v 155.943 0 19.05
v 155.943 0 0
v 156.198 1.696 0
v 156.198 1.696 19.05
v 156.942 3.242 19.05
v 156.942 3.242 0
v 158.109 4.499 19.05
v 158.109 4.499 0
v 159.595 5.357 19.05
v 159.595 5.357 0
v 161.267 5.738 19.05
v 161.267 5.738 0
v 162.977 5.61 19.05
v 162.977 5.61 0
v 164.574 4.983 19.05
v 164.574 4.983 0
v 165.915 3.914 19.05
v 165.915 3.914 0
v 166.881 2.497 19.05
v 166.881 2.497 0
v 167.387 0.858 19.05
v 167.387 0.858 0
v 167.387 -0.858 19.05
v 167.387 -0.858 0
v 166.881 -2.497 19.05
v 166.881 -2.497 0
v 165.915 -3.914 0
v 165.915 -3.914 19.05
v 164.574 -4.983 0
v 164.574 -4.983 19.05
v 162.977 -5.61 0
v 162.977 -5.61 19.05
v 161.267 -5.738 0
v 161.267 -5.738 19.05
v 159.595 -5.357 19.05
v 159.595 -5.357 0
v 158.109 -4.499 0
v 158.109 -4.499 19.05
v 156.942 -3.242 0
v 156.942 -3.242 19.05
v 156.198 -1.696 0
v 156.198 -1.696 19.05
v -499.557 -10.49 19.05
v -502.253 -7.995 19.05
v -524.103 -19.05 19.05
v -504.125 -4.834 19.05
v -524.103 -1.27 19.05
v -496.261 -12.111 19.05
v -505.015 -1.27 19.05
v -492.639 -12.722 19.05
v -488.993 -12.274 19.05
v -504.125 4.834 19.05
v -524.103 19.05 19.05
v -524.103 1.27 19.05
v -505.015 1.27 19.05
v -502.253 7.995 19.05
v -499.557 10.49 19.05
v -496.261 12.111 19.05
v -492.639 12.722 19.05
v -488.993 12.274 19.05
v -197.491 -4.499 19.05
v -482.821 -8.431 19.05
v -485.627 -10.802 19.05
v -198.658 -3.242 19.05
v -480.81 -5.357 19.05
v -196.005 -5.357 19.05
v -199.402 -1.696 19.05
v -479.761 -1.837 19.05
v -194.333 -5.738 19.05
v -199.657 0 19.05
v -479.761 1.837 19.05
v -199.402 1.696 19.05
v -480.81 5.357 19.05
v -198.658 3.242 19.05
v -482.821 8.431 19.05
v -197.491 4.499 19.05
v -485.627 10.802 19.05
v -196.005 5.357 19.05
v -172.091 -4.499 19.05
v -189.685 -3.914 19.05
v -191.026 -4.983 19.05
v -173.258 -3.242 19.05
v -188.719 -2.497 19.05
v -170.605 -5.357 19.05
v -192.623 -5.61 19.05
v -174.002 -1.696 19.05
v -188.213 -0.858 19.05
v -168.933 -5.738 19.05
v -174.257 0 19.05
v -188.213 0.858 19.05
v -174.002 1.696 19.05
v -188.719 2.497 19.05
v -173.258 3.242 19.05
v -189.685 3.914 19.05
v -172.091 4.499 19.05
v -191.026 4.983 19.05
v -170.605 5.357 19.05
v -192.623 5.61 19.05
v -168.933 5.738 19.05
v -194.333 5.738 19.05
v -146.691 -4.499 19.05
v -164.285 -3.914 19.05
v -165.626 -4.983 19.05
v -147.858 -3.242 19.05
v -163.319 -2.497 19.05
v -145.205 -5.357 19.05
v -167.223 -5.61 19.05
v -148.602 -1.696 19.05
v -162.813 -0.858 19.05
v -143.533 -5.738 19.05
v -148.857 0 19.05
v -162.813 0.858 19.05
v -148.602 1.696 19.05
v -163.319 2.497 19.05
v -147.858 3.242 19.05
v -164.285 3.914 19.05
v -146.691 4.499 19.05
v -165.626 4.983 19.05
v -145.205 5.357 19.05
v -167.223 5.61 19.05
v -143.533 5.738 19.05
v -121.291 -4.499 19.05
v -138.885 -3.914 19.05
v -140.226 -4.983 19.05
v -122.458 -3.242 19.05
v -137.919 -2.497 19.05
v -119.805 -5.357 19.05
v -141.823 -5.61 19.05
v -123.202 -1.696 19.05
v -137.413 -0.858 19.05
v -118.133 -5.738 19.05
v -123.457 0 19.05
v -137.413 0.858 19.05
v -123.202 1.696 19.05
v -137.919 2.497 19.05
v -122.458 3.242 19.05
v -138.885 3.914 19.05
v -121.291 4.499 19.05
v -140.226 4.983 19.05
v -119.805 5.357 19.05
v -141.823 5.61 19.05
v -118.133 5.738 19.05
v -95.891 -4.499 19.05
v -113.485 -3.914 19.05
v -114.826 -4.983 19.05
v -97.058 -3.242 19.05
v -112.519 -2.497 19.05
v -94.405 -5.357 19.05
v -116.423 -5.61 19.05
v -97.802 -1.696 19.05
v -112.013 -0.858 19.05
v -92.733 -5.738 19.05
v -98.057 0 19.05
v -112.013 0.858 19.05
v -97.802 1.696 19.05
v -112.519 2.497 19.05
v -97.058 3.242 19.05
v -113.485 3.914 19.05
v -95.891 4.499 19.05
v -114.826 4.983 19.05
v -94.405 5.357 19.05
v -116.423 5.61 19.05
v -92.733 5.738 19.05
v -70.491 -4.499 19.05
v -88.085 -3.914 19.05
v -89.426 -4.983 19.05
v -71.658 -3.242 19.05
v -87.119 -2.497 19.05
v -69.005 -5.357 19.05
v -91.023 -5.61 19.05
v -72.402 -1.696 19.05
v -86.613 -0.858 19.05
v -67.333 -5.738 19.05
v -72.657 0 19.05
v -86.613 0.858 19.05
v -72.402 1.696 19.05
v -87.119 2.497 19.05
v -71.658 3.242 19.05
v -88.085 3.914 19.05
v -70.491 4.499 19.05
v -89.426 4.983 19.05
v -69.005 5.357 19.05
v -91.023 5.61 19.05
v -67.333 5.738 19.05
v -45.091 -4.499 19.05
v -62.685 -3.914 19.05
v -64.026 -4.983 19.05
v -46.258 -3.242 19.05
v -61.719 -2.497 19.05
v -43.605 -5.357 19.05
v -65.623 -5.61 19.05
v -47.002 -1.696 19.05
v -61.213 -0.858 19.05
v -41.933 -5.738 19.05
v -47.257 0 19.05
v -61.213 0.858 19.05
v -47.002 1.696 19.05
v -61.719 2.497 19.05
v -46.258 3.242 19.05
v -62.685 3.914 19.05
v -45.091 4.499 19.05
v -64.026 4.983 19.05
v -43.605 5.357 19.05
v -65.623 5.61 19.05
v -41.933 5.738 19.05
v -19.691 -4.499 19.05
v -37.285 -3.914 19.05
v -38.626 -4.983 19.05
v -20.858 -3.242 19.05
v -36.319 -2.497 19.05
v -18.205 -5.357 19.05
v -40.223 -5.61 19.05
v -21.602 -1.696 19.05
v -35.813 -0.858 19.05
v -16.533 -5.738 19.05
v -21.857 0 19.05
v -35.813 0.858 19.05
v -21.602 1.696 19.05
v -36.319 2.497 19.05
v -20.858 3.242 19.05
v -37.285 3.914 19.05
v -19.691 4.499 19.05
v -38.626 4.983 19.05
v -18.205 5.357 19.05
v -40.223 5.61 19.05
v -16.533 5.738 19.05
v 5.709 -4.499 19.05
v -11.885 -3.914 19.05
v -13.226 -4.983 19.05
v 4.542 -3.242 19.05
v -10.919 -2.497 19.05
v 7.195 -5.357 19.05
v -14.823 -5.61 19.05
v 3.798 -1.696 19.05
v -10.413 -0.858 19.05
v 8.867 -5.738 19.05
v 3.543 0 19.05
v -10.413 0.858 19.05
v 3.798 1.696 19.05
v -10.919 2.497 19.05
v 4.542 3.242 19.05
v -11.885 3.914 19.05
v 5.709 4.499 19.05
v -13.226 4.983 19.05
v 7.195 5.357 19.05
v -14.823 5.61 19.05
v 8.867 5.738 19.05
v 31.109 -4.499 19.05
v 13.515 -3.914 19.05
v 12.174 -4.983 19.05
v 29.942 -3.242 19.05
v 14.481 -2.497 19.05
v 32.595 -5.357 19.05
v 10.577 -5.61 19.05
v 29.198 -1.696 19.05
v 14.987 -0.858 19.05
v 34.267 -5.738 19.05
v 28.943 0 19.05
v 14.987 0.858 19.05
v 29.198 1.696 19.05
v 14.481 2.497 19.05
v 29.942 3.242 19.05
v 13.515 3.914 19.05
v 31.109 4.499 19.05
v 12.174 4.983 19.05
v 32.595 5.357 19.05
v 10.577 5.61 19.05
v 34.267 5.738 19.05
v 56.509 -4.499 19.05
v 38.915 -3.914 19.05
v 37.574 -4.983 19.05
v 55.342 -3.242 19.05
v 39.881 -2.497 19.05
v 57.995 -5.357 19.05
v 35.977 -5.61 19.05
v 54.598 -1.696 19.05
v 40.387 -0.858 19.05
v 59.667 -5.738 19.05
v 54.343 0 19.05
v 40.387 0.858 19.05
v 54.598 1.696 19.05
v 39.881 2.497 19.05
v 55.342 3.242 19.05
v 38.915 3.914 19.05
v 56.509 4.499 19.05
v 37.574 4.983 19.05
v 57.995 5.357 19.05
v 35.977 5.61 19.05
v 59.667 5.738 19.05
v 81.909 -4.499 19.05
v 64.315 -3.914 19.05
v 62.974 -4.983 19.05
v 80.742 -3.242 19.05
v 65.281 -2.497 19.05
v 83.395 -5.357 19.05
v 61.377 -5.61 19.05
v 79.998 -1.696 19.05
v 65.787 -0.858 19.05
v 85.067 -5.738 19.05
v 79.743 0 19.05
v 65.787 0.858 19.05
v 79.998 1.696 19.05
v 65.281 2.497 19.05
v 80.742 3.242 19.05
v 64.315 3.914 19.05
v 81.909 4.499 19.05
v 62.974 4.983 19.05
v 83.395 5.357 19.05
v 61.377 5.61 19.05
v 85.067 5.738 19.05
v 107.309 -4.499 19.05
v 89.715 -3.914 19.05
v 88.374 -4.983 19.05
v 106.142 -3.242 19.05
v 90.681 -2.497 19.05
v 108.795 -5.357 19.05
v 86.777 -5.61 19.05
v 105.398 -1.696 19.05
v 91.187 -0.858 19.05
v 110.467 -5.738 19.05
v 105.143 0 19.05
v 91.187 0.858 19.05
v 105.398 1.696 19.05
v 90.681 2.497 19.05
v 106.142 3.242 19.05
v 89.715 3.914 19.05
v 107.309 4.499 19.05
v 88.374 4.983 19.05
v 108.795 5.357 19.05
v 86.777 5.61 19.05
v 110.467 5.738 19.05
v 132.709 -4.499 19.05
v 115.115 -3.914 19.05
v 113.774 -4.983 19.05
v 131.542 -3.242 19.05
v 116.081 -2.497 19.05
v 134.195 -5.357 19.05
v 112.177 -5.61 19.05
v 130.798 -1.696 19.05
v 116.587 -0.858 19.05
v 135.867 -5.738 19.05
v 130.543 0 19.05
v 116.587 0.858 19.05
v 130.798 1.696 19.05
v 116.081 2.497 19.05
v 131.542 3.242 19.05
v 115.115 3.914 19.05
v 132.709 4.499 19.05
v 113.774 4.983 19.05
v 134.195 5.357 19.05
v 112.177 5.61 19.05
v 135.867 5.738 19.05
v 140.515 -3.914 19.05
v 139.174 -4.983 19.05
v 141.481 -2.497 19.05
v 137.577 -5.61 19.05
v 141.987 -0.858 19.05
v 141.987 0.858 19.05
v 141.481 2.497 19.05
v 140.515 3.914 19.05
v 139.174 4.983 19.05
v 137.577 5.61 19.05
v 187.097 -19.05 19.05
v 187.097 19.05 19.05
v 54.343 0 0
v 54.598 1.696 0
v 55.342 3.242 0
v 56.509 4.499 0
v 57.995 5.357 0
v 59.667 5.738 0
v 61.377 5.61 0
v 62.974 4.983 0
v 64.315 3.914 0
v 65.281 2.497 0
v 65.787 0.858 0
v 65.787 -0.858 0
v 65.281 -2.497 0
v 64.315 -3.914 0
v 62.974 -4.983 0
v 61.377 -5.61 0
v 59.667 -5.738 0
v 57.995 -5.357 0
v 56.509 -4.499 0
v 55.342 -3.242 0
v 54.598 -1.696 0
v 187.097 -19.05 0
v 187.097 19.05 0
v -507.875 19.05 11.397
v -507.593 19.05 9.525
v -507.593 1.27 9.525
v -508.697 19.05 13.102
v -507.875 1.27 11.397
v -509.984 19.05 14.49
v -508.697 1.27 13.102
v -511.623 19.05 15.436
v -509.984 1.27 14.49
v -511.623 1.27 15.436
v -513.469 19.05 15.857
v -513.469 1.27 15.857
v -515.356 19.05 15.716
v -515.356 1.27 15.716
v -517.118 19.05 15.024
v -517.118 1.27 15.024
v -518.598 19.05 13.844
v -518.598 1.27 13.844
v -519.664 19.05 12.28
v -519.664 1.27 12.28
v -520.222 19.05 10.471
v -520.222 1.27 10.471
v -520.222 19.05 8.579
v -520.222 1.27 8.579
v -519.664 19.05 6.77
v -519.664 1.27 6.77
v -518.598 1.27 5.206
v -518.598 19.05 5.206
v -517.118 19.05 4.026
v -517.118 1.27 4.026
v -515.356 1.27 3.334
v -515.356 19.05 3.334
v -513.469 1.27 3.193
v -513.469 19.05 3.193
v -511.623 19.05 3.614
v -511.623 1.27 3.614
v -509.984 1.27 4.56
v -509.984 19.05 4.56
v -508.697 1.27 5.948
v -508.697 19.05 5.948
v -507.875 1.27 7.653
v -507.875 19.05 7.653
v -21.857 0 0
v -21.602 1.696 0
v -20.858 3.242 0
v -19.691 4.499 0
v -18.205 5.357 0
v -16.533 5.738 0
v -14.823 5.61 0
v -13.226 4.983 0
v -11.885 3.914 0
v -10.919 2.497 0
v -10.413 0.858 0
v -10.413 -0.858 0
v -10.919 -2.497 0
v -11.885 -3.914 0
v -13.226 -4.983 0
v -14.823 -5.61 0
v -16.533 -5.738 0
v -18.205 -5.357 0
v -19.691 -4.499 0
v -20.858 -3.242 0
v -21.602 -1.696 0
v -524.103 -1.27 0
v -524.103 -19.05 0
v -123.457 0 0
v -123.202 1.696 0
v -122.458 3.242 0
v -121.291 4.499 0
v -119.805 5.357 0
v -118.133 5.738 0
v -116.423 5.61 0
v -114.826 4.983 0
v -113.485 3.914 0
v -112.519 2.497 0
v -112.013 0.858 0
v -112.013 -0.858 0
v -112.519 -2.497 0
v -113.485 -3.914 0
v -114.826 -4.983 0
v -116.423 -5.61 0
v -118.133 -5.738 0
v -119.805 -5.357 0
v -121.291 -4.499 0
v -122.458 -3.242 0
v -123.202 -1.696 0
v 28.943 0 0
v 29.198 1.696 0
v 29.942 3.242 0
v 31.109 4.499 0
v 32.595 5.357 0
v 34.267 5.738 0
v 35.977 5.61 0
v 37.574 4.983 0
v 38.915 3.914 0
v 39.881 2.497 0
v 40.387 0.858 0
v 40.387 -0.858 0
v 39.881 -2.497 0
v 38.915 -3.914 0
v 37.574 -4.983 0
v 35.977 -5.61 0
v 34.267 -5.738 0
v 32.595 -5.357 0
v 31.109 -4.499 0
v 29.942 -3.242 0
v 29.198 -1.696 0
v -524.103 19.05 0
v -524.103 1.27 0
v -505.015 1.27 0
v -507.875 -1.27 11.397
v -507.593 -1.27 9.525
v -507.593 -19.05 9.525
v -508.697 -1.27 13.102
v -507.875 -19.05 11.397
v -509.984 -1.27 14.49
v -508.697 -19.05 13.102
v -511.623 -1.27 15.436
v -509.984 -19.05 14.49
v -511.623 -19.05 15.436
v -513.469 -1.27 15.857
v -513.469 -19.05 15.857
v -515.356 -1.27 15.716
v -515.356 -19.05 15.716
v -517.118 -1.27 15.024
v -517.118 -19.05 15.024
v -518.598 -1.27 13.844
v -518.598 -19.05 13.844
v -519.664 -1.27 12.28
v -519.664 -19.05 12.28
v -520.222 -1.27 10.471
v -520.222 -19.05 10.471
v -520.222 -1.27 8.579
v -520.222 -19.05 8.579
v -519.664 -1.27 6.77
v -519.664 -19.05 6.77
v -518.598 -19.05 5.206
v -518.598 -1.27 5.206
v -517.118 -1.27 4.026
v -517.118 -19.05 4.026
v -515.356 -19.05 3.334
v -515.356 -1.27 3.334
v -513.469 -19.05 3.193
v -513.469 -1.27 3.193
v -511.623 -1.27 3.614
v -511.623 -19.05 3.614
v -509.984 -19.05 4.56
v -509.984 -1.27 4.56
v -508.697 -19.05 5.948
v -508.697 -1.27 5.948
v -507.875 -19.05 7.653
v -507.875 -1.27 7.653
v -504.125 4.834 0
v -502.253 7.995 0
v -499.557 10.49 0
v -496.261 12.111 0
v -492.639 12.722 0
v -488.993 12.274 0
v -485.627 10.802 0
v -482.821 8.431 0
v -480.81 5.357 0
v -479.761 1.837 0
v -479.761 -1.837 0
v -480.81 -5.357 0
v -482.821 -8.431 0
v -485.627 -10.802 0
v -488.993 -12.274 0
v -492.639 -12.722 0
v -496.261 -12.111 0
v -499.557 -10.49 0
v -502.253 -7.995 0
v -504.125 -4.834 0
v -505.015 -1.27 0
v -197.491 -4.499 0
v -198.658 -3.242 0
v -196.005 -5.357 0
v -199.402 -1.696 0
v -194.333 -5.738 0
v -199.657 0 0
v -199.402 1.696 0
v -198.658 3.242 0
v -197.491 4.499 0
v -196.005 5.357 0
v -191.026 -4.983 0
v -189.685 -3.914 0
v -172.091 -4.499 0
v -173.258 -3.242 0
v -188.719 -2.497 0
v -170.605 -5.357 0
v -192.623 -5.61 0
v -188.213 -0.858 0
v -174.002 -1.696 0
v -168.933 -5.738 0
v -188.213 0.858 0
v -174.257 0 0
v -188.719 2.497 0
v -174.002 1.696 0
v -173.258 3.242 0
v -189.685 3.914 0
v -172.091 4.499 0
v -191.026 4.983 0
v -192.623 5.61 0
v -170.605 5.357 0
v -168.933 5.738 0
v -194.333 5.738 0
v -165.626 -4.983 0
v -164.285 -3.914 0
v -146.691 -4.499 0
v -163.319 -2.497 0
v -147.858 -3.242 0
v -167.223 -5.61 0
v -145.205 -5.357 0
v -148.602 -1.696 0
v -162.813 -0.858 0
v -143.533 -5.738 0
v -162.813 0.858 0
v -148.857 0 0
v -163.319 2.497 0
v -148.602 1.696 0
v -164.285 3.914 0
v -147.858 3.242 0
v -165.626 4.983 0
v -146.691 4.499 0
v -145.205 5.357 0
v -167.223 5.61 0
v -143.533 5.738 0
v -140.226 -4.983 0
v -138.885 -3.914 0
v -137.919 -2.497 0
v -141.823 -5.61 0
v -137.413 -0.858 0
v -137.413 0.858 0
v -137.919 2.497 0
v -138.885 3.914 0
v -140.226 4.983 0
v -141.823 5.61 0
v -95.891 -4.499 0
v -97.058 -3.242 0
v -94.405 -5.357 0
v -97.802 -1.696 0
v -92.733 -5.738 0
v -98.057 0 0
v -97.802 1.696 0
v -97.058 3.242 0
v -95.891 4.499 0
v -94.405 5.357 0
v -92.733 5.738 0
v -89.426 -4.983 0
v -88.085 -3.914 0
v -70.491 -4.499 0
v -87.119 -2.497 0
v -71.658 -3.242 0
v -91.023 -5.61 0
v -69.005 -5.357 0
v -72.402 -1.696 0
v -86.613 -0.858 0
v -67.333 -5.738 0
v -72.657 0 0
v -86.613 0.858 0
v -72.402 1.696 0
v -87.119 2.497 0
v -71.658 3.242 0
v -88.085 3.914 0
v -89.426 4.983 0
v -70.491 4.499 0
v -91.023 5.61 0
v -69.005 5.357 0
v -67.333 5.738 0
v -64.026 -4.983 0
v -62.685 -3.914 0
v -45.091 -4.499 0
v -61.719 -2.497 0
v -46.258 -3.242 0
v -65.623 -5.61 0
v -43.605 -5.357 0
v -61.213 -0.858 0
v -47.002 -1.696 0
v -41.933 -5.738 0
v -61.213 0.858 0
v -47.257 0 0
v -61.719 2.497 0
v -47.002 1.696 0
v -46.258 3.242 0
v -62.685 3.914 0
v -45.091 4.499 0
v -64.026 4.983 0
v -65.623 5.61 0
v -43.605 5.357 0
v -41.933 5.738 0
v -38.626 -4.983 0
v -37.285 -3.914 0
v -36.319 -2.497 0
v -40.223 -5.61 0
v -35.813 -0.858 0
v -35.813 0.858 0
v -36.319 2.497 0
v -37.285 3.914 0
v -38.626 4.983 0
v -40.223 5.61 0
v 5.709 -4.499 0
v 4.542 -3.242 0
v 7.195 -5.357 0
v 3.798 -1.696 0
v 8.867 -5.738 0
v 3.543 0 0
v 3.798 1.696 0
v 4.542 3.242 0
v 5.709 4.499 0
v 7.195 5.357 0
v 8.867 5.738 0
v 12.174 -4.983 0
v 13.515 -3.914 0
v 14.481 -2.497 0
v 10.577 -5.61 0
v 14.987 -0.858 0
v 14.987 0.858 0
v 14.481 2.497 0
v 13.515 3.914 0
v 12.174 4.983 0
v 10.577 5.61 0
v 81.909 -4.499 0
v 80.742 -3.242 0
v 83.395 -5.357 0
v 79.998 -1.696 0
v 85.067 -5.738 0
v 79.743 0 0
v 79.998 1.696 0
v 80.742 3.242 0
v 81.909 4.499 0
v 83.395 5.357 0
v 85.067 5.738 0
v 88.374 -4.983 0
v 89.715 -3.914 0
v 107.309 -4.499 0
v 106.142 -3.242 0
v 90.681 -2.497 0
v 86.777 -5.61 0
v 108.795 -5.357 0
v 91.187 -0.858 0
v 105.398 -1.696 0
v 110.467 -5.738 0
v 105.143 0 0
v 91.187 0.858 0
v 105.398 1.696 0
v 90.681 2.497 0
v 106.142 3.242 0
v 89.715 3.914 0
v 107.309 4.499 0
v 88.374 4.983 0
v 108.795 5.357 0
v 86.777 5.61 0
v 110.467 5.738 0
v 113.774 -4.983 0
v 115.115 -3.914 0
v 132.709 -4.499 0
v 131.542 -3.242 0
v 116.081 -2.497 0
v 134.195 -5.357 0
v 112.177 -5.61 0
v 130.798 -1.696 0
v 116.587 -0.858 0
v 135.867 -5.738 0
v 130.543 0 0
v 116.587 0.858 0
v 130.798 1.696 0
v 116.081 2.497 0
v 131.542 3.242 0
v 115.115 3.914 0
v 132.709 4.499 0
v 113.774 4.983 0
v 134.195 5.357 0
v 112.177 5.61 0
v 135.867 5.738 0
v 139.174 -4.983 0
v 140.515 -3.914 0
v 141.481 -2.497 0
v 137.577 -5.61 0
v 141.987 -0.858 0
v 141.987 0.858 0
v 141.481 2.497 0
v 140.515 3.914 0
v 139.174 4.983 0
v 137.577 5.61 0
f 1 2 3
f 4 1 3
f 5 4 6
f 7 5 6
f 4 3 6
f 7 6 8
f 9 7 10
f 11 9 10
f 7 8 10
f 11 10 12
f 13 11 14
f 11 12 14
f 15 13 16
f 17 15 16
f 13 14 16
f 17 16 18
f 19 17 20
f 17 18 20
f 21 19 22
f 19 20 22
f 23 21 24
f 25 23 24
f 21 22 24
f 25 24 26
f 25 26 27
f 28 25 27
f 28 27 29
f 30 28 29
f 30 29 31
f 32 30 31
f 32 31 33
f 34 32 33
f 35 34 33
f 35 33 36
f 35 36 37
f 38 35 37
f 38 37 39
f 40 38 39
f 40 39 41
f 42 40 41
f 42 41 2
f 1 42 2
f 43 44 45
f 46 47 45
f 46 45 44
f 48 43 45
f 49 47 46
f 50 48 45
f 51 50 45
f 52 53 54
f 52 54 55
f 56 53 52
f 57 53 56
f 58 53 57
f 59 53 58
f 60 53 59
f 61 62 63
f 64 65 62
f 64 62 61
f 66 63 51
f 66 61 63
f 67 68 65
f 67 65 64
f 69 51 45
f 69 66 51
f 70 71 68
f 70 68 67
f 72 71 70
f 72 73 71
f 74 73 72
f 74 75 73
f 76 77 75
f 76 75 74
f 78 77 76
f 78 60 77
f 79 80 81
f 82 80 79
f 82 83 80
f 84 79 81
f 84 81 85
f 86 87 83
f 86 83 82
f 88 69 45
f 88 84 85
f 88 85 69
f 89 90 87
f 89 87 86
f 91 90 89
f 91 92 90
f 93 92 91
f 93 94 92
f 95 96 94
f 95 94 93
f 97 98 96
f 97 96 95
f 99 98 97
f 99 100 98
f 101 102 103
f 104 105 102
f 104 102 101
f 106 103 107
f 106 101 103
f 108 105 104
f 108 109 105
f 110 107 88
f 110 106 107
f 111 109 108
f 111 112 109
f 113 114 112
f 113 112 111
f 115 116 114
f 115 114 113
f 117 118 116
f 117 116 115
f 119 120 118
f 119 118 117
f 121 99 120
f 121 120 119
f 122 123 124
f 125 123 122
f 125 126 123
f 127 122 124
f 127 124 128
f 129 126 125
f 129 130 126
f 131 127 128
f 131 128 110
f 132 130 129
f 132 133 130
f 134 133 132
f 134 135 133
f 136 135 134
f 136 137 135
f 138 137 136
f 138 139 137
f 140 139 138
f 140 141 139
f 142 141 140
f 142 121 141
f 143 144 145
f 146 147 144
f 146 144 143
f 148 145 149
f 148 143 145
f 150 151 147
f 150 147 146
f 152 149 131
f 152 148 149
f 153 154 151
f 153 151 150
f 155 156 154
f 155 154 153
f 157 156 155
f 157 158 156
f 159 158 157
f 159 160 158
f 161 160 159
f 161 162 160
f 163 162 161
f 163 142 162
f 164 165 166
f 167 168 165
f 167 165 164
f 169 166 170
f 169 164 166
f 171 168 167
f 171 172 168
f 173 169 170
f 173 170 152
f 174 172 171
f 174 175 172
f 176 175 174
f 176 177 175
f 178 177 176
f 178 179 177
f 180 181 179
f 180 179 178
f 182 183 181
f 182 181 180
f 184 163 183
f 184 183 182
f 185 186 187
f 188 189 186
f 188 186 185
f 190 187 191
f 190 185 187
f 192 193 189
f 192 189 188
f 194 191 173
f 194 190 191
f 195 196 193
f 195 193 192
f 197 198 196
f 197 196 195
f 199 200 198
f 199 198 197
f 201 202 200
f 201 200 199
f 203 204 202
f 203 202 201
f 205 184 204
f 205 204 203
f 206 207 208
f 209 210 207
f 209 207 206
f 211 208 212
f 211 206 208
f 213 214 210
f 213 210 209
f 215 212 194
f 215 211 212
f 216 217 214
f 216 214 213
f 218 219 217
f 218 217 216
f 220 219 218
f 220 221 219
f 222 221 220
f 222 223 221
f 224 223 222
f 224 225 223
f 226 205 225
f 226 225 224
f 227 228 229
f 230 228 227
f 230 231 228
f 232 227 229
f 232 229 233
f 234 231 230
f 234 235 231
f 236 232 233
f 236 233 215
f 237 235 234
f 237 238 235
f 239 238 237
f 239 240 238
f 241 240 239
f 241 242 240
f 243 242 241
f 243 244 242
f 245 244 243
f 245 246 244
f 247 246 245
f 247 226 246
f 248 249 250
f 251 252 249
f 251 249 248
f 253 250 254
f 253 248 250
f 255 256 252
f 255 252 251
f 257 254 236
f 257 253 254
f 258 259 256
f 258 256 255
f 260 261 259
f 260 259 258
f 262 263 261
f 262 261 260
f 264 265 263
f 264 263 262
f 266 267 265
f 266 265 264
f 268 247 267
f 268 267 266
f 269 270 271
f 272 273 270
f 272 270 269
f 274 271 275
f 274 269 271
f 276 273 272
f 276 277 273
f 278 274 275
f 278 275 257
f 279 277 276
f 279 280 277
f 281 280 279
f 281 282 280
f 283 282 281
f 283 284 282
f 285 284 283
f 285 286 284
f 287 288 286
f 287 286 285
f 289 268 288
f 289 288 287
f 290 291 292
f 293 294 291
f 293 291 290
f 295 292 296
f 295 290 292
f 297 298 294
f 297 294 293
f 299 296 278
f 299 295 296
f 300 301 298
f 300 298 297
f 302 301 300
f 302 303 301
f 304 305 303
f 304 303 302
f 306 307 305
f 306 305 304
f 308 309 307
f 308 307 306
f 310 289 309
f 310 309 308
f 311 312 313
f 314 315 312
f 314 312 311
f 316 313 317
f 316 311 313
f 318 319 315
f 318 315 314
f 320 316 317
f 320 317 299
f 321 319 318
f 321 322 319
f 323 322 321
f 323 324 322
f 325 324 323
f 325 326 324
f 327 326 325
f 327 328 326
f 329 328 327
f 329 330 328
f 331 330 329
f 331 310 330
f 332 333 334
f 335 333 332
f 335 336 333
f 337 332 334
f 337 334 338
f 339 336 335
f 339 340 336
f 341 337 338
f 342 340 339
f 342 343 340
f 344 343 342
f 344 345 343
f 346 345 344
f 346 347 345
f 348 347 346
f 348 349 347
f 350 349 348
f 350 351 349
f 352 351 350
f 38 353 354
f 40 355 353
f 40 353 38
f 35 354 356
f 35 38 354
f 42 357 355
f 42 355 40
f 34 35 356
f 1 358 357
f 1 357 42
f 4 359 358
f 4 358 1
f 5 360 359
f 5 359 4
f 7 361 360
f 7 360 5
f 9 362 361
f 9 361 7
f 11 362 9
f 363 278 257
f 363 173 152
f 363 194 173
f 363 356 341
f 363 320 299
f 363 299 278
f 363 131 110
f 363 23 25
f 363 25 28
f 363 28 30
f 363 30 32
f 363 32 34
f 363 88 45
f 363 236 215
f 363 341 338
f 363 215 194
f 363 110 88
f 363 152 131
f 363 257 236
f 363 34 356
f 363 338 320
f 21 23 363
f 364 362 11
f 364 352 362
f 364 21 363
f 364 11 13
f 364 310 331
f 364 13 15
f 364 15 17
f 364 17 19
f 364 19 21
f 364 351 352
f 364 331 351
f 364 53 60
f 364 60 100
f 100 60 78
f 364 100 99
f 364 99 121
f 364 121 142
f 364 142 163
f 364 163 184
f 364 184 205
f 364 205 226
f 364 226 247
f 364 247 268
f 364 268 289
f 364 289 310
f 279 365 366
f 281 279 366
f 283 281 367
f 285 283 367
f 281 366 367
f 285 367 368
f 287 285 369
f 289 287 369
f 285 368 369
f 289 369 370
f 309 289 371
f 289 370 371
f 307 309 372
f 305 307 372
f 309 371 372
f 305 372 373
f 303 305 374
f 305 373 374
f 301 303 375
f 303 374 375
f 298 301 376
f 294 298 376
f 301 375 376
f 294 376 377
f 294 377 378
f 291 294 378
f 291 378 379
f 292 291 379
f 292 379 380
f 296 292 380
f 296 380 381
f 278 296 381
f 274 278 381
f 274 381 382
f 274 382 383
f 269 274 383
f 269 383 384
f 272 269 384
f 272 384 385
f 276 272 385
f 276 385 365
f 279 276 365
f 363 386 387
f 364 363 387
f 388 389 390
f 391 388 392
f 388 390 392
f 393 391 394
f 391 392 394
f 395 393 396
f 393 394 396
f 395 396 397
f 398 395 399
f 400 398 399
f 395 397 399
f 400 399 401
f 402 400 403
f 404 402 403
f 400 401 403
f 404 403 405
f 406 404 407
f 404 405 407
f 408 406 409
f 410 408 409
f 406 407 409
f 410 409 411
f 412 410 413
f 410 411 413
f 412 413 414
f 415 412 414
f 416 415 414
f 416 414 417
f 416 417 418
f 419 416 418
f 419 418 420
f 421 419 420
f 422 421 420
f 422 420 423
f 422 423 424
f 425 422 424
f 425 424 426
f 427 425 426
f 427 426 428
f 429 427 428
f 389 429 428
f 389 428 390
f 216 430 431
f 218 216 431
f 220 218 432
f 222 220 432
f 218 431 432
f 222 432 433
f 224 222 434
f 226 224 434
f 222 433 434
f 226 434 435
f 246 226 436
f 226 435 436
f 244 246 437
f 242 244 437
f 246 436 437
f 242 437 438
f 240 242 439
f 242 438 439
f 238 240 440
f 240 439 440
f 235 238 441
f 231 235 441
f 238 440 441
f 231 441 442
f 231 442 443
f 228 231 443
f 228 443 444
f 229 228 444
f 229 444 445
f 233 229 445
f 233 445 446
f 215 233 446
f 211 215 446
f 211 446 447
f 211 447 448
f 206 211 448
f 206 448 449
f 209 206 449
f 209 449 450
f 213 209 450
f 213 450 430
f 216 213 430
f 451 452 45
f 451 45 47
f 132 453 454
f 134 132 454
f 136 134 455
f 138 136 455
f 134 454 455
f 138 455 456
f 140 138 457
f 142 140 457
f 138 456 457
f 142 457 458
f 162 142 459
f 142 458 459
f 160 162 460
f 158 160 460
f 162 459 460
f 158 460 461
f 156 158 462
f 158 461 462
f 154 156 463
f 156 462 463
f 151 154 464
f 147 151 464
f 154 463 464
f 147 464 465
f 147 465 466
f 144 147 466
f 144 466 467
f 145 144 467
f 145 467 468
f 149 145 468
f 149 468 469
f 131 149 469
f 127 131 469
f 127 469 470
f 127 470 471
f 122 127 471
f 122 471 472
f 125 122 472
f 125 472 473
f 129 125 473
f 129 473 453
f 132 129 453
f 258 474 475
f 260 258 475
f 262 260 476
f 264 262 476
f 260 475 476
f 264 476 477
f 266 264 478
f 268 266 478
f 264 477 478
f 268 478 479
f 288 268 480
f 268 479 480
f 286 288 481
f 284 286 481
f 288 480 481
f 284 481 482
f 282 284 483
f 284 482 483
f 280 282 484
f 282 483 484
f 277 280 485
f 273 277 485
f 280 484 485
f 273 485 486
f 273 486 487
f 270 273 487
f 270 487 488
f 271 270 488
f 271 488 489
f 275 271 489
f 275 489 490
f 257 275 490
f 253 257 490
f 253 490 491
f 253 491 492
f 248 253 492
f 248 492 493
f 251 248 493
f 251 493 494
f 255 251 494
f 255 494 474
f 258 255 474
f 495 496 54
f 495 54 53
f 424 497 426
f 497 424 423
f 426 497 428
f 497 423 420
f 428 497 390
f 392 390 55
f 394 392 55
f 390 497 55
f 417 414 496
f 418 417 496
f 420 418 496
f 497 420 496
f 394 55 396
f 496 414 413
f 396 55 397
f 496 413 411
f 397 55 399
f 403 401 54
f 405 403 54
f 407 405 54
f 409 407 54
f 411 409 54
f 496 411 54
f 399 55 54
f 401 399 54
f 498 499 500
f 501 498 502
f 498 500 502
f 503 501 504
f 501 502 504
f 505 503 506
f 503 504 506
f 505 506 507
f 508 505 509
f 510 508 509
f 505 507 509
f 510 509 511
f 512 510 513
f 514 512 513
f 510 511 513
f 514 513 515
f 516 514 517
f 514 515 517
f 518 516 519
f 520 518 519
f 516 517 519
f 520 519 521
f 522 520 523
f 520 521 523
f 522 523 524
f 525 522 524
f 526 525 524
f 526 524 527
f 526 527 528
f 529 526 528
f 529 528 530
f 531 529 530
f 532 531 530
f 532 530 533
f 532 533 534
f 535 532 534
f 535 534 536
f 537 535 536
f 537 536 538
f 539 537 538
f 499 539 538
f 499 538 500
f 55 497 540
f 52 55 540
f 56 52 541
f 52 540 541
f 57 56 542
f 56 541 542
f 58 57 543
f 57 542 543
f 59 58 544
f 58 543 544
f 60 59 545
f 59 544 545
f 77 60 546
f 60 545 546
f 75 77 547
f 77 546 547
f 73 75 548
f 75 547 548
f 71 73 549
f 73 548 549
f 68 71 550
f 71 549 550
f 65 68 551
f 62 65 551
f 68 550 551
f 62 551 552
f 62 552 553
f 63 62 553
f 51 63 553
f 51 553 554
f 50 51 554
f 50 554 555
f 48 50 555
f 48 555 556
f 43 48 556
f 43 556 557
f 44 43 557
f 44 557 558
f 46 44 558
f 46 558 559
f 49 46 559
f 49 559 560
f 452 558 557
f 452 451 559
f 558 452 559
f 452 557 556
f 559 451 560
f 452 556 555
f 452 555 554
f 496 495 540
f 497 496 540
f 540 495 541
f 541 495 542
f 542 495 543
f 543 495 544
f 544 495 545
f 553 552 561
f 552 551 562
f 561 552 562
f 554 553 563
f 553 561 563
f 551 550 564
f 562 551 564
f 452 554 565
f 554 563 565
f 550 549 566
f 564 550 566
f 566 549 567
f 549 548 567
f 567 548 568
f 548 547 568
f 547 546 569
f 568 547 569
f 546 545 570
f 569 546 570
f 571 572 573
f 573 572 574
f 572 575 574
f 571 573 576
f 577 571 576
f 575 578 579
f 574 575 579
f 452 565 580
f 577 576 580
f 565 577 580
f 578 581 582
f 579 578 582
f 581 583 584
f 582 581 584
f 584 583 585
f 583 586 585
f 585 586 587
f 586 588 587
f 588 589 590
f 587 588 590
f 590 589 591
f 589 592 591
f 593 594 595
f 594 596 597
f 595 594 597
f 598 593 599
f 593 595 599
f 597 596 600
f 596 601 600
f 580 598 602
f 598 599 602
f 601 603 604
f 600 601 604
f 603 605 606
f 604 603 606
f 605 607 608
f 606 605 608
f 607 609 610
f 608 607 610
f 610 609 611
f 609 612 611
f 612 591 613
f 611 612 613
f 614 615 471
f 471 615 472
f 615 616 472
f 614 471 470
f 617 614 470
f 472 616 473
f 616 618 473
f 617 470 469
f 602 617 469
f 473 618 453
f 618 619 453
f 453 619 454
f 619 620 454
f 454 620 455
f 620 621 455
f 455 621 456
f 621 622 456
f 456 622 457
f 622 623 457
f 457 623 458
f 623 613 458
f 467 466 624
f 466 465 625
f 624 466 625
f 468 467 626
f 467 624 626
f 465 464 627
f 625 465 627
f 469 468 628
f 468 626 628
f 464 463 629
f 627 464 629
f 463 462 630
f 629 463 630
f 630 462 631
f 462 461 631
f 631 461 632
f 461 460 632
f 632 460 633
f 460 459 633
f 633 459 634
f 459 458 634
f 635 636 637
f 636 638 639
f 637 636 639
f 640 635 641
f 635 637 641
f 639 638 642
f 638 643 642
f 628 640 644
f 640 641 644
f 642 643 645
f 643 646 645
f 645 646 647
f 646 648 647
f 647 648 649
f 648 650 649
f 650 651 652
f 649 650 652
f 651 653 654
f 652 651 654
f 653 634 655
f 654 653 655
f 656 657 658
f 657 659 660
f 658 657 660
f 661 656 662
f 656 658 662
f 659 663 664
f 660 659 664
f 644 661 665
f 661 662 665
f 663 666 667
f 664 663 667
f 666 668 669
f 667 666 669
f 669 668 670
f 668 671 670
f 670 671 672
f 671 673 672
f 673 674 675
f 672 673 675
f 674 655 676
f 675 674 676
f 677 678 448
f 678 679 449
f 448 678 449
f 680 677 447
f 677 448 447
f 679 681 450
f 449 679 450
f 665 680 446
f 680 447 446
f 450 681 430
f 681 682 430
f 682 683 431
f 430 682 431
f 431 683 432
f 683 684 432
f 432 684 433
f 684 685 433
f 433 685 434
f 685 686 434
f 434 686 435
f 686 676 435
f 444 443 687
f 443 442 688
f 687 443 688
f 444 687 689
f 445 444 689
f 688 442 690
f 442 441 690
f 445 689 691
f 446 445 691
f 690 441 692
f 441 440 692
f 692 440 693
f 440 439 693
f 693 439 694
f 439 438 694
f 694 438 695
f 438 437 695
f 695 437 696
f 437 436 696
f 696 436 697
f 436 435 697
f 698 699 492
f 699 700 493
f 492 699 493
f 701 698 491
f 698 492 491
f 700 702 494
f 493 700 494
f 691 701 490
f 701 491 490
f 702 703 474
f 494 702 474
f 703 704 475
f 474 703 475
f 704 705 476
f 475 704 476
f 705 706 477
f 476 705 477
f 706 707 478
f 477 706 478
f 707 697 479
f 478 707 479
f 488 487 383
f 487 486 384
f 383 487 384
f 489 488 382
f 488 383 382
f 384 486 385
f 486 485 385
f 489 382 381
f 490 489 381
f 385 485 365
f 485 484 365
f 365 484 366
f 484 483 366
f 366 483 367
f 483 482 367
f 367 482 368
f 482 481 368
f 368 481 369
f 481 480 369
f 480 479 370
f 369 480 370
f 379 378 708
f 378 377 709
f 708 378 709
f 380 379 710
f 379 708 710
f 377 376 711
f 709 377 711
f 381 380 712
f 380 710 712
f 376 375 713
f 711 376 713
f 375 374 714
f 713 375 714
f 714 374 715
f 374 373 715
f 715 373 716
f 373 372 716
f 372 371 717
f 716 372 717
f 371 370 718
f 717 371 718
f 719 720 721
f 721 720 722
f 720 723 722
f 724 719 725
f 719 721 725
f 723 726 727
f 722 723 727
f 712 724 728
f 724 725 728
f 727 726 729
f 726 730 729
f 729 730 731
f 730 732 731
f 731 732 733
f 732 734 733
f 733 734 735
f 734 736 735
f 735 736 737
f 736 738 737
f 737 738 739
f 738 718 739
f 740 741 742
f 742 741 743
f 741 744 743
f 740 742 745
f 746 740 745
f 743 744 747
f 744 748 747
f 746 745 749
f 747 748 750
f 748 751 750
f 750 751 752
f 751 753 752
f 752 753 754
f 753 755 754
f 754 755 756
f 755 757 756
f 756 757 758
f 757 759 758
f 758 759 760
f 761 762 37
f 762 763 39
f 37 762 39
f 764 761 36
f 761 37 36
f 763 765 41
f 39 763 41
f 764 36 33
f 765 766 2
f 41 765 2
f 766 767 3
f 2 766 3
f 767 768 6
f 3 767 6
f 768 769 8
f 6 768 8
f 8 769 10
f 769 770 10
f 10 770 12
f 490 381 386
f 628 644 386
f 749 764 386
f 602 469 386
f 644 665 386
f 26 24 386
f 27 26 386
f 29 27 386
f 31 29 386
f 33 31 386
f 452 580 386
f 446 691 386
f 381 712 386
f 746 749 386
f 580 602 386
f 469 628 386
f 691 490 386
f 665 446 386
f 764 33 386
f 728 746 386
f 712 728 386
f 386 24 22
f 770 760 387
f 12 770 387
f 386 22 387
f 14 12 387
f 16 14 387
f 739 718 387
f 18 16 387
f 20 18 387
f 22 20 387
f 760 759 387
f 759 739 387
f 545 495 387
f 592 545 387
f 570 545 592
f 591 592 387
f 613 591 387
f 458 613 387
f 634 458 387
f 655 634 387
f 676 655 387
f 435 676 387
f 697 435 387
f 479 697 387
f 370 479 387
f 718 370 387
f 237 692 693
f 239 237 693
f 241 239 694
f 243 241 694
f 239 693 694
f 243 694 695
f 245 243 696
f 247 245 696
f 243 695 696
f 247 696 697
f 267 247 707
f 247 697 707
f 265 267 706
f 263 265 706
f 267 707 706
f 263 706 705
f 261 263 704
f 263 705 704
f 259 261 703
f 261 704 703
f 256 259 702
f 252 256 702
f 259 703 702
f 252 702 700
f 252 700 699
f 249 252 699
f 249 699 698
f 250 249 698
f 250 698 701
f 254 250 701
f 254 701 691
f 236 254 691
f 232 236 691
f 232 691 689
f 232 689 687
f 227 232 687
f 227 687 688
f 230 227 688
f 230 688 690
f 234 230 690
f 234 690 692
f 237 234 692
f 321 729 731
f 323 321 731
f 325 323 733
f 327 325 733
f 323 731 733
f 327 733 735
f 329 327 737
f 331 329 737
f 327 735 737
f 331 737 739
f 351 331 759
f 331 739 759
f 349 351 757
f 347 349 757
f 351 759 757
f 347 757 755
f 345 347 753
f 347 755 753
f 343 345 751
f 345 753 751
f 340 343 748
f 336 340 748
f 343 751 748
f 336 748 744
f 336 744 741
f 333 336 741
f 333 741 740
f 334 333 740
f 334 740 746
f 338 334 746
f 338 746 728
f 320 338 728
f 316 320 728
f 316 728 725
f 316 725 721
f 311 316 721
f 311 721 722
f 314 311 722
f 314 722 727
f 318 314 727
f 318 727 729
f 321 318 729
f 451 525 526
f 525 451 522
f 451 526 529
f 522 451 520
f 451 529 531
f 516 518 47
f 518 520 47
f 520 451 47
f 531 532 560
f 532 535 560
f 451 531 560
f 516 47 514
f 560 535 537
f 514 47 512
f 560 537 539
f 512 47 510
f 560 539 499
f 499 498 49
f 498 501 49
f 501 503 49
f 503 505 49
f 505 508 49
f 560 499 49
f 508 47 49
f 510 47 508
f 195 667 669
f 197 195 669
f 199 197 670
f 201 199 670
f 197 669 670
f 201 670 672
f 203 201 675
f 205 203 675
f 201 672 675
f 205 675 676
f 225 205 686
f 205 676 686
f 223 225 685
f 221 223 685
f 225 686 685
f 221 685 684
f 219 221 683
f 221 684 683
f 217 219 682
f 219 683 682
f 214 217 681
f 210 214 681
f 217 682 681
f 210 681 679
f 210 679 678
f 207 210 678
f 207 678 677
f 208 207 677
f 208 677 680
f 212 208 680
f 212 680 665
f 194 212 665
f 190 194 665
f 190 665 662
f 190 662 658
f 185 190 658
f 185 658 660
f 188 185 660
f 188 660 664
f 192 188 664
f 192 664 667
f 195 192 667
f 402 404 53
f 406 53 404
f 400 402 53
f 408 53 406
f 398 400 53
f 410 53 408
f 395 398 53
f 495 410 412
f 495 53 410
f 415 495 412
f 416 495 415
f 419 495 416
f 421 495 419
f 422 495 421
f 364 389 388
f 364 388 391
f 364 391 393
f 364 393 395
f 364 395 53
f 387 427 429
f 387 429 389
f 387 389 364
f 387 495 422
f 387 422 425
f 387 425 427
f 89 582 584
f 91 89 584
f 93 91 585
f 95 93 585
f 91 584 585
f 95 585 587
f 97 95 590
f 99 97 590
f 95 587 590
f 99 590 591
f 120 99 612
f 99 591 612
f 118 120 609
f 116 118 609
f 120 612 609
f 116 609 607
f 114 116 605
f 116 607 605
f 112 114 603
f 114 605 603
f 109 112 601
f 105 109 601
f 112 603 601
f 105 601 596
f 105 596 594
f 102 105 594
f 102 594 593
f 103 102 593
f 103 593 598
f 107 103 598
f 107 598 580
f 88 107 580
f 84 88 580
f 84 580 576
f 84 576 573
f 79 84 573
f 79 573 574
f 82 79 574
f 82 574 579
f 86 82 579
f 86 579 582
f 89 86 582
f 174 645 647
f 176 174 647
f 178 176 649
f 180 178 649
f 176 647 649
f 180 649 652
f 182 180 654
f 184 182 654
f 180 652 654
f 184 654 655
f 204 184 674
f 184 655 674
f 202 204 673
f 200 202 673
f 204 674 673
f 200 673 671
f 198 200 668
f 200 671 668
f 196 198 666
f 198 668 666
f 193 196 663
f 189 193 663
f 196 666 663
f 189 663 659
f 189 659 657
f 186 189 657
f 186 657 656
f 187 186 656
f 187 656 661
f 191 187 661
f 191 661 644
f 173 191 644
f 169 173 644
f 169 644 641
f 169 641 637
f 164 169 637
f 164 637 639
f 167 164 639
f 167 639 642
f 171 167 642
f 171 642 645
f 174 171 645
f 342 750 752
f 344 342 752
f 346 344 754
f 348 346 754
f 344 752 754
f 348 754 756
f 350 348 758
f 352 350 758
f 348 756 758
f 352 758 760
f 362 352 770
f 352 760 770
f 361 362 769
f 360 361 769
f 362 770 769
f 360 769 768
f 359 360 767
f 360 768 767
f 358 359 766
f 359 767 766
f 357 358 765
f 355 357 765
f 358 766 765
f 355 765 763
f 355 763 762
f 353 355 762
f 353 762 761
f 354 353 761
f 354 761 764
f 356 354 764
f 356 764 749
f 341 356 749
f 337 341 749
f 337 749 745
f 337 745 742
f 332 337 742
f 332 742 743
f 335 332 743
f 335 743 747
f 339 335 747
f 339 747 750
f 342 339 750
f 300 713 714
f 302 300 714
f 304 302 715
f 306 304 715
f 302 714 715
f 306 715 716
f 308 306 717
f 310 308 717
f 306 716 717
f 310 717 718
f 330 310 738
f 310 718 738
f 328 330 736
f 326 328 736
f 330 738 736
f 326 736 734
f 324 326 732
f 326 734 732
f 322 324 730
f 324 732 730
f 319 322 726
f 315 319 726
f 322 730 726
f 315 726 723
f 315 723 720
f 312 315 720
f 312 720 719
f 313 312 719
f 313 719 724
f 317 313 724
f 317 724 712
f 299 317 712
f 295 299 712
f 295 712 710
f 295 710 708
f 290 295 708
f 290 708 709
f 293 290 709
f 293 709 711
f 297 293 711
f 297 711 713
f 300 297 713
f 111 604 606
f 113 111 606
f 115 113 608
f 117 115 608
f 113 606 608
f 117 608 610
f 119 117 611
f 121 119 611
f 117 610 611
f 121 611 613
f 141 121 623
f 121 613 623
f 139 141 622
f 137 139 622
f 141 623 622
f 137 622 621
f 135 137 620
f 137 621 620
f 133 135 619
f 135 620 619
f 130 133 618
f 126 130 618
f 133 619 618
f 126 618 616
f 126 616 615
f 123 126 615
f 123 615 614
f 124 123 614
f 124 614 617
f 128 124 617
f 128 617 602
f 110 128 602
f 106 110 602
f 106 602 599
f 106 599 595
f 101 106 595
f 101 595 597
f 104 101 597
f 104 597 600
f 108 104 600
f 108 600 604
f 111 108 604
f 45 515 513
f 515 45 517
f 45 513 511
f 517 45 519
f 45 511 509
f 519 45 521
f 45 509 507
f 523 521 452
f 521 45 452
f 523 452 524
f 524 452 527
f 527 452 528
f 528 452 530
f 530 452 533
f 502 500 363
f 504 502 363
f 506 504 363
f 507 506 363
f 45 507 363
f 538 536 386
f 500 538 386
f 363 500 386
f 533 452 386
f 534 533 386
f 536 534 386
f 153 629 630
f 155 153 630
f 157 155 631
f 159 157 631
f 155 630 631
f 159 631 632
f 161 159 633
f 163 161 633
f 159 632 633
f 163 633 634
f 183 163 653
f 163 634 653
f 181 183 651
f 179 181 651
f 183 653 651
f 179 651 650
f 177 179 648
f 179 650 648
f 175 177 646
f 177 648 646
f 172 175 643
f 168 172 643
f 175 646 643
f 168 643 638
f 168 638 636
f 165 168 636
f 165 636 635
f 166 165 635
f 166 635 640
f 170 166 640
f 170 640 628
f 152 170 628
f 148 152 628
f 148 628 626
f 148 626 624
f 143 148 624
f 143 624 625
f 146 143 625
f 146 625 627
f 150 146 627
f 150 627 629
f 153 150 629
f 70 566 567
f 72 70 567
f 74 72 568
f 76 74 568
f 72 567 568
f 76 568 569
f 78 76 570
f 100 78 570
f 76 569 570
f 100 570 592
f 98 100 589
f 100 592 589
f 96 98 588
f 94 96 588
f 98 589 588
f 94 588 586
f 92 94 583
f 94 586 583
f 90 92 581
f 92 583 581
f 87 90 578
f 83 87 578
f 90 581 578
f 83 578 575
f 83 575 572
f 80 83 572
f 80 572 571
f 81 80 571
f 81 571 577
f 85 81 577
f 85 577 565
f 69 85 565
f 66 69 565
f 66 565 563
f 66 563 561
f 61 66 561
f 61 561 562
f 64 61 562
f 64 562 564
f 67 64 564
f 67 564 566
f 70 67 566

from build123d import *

# Parameters (mm, degrees)
F0_W     = 711.2
F0_H     = 38.1
F1_DEPTH = 19.05
F3_D     = 11.50874
F5_D     = 25.4508
F6_W     = 6.5565072059
F6_H     = 2.54
F7_DEPTH = 19.051
F9_D     = 12.7


with BuildPart() as f1:
    # F0 (on Top) → F1 (new body)
    with BuildSketch(Plane.XY):
        with Locations((-168.5031287369, 0)):
            Rectangle(F0_W, F0_H)
    extrude(amount=F1_DEPTH)

    # F3 (through all)
    with Locations(Plane.XY.offset(19.05)):
        with Locations((-143.1031287369, 0), (-117.7031287369, 0), (-92.3031287369, 0), (-66.9031287369, 0), (-16.1031287369, 0), (-41.5031287369, 0), (9.2968712631, 0), (34.6968712631, 0), (60.0968712631, 0), (85.4968712631, 0), (-168.5031287369, 0), (-193.9031287369, 0), (110.8968712631, 0), (136.2968712631, 0), (161.6968712631, 0)):
            Hole(F3_D / 2)

    # F5 (through all)
    with Locations(Plane.XY.offset(19.05)):
        with Locations((-492.3531287369, 0)):
            Hole(F5_D / 2)

    # F6 (on face) → F7 (cut, through all)
    with BuildSketch(Plane.XY.offset(19.05)):
        with Locations((-527.3813823399, 0)):
            Rectangle(F6_W, F6_H)
        with BuildLine():
            Line((-494.1921649058, 1.27), (-505.0149968913, 1.27))
            ThreePointArc((-505.0149968913, 1.27), (-505.0785287369, 0), (-505.0149968913, -1.27))
            Line((-505.0149968913, -1.27), (-494.1921649058, -1.27))
            Line((-494.1921649058, -1.27), (-494.1921649058, 1.27))
        make_face()
        with BuildLine():
            Line((-505.0149968913, 1.27), (-524.1031287369, 1.27))
            Line((-524.1031287369, 1.27), (-524.1031287369, -1.27))
            Line((-524.1031287369, -1.27), (-505.0149968913, -1.27))
            ThreePointArc((-505.0149968913, -1.27), (-505.0785287369, 0), (-505.0149968913, 1.27))
        make_face()
    extrude(amount=-F7_DEPTH, mode=Mode.SUBTRACT)

    # F9 (through all)
    with Locations(Plane(origin=(0, 19.05, 0), x_dir=(-1, 0, 0), z_dir=(0, 1, 0))):
        with Locations((513.9431287369, 9.525)):
            Hole(F9_D / 2)


solid = f1.part
